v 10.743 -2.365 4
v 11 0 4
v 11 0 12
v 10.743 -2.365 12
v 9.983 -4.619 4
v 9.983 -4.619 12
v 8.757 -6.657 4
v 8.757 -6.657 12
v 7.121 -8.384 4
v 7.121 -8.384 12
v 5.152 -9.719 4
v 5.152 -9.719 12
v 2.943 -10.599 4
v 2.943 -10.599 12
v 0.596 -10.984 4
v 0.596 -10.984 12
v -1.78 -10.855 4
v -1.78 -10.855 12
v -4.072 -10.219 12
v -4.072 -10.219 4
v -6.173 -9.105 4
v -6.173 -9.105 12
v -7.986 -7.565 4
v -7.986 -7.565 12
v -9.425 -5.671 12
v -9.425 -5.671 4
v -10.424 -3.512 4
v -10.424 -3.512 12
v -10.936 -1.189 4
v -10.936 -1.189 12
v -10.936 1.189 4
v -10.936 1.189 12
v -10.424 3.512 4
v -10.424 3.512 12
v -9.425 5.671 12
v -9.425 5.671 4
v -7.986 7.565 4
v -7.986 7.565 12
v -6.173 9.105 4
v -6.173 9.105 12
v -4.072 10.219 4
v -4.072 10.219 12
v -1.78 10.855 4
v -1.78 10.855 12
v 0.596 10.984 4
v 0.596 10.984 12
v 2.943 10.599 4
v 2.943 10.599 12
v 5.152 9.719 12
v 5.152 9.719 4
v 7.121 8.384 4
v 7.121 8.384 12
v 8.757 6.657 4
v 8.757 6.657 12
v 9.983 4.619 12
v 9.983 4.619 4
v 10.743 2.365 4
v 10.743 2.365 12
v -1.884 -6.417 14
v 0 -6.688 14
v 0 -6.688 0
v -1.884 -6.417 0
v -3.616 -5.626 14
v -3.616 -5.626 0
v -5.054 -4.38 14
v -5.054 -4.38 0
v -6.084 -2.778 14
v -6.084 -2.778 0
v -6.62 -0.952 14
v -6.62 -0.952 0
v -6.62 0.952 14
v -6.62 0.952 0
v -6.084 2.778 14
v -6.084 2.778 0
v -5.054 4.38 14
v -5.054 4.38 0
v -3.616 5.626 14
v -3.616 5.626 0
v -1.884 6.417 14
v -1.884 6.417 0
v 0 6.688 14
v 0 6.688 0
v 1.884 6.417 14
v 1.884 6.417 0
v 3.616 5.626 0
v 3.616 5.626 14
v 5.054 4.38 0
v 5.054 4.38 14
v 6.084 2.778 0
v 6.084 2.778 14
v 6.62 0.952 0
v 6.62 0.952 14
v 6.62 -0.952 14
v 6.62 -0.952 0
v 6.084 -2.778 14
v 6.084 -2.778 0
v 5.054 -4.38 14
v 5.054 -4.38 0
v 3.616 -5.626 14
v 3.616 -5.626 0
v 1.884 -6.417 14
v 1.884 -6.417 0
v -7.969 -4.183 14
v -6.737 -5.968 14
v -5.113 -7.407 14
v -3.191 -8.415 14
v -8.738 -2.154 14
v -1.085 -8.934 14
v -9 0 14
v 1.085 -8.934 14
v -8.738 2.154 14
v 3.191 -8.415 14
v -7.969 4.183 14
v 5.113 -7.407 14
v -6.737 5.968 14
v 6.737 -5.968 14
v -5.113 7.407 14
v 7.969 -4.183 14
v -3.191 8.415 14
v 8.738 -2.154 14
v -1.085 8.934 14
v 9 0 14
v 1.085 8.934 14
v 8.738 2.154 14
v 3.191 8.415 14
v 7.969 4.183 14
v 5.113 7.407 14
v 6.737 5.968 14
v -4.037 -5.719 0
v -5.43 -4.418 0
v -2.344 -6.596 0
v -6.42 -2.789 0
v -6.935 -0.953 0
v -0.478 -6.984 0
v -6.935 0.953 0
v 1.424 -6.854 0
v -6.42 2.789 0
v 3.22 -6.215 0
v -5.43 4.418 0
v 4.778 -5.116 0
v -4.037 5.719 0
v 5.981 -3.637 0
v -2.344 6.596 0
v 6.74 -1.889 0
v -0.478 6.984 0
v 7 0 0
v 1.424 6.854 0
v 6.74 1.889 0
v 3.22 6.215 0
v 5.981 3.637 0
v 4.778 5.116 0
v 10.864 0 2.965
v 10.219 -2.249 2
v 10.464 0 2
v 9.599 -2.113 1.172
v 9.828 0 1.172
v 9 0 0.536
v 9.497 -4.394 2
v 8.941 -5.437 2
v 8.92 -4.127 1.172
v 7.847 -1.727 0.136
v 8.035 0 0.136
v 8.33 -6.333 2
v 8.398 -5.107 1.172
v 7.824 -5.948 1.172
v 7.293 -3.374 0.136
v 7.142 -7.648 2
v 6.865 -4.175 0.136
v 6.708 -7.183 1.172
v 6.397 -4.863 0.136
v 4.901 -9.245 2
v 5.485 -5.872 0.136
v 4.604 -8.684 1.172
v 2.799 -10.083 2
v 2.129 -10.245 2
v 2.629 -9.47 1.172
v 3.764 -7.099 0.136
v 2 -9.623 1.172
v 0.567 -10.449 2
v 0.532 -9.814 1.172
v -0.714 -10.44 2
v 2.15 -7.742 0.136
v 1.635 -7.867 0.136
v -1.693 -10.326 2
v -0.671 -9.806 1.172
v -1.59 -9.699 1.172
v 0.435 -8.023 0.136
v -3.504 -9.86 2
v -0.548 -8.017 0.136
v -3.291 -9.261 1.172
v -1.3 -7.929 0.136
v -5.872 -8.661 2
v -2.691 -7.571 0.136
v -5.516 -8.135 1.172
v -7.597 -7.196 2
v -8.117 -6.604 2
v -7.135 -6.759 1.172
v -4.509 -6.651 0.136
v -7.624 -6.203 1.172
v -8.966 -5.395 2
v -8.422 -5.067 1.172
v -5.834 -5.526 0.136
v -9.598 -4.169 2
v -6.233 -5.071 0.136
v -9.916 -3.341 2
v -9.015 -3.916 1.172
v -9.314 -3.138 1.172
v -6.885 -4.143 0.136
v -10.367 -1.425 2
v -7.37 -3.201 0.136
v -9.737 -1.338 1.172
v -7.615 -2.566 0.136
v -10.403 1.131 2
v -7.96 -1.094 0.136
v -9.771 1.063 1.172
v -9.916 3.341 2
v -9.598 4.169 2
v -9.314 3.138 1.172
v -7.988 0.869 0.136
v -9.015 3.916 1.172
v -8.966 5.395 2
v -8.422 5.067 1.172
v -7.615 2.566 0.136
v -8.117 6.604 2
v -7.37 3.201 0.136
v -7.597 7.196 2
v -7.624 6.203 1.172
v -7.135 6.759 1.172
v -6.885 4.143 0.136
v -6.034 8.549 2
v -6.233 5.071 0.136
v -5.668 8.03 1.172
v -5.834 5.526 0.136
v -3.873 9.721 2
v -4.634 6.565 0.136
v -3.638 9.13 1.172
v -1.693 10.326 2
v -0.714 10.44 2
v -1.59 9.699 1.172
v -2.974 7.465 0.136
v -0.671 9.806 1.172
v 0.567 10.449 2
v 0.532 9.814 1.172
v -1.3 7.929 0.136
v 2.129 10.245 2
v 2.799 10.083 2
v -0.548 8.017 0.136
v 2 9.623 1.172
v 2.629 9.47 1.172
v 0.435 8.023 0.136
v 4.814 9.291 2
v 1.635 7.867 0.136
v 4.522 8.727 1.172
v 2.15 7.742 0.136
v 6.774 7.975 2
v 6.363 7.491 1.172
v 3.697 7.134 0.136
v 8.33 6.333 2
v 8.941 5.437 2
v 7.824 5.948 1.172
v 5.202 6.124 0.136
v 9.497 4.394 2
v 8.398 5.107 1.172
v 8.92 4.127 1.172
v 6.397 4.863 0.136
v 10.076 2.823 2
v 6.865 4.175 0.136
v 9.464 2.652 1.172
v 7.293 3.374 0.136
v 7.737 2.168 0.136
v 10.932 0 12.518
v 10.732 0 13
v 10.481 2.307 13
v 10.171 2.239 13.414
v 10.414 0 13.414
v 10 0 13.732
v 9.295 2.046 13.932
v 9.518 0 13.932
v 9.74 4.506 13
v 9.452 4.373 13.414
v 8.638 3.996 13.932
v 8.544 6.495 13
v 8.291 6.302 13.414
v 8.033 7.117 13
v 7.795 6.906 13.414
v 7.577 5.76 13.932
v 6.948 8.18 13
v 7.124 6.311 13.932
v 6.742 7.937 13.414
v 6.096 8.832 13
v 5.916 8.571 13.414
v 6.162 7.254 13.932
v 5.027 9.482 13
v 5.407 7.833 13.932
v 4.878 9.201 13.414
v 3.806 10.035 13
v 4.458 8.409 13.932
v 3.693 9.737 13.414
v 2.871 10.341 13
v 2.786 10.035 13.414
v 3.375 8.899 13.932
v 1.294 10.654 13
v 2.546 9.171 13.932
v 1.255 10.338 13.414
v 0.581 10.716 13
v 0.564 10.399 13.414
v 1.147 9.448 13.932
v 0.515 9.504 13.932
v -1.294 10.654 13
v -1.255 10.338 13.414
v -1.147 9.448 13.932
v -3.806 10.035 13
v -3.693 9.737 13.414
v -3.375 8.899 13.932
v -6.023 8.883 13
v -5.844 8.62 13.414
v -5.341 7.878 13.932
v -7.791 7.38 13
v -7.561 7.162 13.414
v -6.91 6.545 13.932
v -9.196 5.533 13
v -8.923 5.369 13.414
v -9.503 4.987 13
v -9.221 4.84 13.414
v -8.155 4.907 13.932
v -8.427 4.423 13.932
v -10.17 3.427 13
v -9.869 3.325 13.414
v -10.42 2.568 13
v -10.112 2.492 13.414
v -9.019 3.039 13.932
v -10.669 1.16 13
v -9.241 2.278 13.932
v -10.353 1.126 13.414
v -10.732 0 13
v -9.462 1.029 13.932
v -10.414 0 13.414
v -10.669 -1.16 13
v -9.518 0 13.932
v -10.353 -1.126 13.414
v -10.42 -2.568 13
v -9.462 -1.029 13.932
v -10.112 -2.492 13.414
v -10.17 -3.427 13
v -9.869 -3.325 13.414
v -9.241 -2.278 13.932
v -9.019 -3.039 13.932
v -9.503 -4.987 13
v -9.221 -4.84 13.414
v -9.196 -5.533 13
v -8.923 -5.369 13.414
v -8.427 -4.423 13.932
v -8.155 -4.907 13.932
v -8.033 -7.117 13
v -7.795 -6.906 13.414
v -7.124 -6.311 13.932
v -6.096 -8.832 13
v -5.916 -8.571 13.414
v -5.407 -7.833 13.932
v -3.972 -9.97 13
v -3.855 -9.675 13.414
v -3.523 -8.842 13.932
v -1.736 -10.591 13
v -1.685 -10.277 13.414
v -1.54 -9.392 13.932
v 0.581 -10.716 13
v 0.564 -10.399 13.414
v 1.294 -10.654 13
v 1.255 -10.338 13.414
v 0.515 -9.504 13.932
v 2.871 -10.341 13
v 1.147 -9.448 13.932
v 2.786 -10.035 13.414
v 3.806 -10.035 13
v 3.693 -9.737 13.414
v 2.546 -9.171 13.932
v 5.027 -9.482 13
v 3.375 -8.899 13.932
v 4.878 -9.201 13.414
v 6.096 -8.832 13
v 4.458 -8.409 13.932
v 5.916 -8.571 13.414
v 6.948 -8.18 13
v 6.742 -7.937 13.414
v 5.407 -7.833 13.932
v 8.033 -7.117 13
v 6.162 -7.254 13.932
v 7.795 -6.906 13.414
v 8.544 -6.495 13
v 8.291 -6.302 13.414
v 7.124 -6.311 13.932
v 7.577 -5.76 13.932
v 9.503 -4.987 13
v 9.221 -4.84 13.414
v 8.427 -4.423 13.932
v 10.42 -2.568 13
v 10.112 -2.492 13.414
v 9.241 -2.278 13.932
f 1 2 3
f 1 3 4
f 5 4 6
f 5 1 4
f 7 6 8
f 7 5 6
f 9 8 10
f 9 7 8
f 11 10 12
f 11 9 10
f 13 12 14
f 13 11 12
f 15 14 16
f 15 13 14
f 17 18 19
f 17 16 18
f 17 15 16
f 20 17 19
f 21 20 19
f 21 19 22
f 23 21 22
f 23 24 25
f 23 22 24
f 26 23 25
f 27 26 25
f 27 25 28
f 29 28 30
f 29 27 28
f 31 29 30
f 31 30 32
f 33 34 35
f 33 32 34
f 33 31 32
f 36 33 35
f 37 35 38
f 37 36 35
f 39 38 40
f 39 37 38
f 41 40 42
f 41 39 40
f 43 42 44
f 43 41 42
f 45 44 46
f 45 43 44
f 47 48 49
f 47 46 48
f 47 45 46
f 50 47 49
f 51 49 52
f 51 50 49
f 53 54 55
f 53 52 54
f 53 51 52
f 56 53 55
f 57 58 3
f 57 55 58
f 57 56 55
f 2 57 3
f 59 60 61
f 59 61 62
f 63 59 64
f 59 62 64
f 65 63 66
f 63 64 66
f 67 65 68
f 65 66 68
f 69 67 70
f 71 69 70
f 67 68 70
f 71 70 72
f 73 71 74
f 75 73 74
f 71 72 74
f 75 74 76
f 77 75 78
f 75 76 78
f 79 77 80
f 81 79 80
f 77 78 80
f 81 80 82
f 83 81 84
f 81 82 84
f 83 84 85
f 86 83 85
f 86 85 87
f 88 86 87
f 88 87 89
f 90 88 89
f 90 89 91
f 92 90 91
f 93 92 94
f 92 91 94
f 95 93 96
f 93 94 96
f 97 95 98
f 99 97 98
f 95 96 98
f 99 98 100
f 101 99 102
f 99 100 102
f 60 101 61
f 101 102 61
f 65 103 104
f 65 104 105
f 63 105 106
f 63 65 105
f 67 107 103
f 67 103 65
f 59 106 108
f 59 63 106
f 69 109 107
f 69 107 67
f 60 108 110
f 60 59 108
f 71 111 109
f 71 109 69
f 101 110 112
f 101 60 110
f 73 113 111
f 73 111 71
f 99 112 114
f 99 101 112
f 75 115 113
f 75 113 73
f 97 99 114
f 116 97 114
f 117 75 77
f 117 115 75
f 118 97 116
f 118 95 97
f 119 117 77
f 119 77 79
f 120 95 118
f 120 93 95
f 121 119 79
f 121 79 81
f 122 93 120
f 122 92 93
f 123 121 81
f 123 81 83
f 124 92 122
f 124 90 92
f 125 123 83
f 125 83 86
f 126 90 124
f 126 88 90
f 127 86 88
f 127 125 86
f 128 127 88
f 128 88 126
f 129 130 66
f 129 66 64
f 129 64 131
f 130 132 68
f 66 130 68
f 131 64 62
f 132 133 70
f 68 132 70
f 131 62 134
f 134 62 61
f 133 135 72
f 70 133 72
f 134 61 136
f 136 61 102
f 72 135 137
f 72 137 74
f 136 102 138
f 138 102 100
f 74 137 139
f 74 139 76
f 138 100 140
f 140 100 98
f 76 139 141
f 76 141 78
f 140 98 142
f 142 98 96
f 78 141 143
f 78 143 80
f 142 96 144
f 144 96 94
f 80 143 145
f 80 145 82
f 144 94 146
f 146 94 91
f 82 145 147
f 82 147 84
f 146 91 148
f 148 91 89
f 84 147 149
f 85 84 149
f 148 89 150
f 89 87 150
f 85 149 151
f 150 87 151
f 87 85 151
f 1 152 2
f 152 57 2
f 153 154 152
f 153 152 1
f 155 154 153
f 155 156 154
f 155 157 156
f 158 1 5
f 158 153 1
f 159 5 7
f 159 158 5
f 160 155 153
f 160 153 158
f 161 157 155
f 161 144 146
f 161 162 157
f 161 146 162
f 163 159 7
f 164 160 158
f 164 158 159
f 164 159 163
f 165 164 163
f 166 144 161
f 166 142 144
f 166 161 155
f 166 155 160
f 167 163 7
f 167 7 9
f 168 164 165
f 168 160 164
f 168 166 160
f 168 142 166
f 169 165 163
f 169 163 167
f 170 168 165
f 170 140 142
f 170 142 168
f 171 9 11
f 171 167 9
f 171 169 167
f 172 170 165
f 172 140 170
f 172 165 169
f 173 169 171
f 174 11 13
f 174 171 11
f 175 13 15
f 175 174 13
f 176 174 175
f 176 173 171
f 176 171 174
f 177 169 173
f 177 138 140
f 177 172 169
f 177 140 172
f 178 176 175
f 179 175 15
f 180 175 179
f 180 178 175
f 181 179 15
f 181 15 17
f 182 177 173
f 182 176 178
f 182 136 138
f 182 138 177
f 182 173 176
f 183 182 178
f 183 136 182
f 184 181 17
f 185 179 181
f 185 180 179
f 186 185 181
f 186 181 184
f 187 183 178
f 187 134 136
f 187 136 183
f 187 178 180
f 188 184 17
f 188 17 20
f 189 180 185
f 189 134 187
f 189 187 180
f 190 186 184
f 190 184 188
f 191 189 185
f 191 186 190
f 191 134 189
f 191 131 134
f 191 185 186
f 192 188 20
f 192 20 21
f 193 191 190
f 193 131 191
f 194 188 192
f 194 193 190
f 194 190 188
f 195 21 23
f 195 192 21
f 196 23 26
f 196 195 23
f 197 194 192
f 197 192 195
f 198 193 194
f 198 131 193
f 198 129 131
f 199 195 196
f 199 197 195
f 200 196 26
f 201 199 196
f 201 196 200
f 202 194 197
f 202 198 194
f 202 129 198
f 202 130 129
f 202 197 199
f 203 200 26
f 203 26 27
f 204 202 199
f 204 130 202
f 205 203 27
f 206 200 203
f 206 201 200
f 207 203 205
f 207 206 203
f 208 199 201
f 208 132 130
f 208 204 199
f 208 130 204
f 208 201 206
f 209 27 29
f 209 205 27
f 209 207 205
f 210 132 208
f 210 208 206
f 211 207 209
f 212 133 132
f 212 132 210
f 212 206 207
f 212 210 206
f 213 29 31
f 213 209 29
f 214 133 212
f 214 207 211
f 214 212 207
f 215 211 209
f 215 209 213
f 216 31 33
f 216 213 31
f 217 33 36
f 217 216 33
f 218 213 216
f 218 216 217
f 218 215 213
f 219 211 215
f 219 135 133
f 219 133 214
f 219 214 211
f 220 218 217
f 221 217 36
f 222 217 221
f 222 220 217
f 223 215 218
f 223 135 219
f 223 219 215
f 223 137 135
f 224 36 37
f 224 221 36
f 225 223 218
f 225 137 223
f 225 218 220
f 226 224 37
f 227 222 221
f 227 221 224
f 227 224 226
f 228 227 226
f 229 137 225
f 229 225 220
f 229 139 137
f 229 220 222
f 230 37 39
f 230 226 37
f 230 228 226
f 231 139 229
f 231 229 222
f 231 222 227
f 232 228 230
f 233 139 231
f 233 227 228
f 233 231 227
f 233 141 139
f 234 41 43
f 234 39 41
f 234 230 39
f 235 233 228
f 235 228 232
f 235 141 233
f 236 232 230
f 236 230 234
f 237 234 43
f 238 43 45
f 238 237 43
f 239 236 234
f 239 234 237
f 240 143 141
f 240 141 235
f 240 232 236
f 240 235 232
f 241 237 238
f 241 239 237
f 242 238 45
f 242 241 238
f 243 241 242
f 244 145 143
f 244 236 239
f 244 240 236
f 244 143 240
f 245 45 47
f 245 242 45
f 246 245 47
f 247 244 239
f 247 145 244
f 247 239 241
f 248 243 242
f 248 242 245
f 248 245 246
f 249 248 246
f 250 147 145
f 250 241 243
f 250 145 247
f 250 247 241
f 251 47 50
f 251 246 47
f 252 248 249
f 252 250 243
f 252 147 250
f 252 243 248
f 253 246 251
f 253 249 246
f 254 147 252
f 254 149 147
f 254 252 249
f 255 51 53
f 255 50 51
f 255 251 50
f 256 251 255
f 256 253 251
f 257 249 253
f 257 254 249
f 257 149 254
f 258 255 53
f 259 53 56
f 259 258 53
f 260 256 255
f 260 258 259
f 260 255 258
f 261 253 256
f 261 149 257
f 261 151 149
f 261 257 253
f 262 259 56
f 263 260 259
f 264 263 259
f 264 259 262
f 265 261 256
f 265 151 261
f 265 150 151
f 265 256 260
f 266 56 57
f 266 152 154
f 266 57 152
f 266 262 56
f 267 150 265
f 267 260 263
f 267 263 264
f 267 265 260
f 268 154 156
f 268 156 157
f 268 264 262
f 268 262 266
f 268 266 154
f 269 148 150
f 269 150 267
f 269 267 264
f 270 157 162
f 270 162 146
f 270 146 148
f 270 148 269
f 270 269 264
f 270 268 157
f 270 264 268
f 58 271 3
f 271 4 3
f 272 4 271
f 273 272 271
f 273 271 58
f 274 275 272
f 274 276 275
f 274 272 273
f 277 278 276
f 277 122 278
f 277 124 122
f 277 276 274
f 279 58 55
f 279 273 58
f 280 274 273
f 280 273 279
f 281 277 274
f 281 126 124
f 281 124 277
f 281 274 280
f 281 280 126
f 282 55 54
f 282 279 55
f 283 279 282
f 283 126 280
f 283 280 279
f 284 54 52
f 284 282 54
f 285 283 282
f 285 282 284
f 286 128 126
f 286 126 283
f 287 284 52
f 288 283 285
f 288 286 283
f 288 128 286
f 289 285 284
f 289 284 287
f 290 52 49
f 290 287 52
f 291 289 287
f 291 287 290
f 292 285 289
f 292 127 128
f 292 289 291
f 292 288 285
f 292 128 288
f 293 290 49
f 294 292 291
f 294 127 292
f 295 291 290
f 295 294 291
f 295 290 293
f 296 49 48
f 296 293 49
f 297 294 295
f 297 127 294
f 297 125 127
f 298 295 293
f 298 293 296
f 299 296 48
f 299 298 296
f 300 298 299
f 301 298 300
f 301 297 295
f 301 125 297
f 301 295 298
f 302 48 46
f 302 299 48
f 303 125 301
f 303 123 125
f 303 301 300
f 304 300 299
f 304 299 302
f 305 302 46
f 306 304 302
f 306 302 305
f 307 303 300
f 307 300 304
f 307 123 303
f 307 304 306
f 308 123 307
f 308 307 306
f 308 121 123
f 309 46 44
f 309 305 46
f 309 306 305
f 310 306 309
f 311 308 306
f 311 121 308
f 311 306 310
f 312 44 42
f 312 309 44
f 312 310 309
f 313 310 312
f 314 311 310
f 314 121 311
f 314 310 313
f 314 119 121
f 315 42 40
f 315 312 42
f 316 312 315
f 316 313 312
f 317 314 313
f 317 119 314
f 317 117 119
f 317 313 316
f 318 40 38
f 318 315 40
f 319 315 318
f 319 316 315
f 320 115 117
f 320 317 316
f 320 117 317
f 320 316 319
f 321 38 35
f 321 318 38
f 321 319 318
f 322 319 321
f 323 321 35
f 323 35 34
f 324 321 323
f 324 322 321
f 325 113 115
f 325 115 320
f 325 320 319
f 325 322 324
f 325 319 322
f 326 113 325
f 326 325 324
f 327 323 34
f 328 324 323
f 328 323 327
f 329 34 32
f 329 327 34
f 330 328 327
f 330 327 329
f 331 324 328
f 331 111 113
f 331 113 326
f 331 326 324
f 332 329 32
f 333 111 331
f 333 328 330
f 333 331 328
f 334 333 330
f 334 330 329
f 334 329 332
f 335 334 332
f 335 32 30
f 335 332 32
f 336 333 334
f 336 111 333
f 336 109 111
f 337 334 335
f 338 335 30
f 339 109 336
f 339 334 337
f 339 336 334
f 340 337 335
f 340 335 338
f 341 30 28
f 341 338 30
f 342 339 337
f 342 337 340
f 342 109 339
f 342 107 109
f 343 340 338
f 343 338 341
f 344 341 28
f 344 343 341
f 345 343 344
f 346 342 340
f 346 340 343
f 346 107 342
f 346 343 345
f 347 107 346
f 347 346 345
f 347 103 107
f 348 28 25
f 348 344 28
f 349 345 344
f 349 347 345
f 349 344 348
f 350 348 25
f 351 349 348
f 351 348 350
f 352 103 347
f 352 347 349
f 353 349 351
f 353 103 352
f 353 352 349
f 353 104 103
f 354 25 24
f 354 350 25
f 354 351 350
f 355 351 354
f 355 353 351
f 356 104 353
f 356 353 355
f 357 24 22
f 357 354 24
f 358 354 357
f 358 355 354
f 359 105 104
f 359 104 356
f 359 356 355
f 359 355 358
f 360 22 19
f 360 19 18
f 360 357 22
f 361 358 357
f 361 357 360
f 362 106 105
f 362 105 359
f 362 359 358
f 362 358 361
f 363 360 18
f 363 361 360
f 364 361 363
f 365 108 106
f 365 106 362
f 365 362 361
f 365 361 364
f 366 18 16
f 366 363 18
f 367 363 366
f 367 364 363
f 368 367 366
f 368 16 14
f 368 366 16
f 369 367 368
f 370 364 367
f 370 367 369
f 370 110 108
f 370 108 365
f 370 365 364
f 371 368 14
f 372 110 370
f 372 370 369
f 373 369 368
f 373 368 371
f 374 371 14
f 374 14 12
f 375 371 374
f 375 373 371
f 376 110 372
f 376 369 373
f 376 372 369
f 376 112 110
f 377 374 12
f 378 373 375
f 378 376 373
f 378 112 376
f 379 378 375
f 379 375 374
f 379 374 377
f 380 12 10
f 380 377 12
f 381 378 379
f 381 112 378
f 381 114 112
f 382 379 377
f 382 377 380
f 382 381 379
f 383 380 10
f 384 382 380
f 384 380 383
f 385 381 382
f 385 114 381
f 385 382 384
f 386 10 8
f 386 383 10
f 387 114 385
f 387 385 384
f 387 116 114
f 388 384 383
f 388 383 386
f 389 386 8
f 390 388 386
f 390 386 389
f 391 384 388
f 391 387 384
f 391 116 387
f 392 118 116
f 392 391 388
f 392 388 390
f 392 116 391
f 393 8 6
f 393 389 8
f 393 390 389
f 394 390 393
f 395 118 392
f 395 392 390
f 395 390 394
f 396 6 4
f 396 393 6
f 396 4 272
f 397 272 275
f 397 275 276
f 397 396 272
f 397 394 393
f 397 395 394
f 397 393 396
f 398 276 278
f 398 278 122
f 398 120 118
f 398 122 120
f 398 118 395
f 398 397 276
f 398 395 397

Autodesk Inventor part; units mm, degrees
ref_plane "YZ Plane" through (0, 0, 0) normal (1, 0, 0) x (0, 1, 0)
ref_plane "XZ Plane" through (0, 0, 0) normal (0, 1, 0) x (-1, 0, 0)
ref_plane "XY Plane" through (0, 0, 0) normal (0, 0, 1) x (1, 0, 0)
sketch "Sketch1" plane through (0, 0, 0) normal (0, 0, 1) x (1, 0, 0)
  circle A0 centre (0, 0) radius 11
  dimension "d0" = 22
extrude "Extrusion1" add sketch "Sketch1" along normal blind 14
fillet "Fillet1" radius 2 1 edges at (-11, 0, 14)
fillet "Fillet1" radius 4 1 edges at (-11, 0, 0)
hole "Hole1" at (0, 0, 14) direction (0, 0, -1) diameter 13.376 end through all thread size "M15x1.5" class "6H" standard "ISO Metric profile"
properties part number "HANDLE CAP" material "Steel, Mild"
